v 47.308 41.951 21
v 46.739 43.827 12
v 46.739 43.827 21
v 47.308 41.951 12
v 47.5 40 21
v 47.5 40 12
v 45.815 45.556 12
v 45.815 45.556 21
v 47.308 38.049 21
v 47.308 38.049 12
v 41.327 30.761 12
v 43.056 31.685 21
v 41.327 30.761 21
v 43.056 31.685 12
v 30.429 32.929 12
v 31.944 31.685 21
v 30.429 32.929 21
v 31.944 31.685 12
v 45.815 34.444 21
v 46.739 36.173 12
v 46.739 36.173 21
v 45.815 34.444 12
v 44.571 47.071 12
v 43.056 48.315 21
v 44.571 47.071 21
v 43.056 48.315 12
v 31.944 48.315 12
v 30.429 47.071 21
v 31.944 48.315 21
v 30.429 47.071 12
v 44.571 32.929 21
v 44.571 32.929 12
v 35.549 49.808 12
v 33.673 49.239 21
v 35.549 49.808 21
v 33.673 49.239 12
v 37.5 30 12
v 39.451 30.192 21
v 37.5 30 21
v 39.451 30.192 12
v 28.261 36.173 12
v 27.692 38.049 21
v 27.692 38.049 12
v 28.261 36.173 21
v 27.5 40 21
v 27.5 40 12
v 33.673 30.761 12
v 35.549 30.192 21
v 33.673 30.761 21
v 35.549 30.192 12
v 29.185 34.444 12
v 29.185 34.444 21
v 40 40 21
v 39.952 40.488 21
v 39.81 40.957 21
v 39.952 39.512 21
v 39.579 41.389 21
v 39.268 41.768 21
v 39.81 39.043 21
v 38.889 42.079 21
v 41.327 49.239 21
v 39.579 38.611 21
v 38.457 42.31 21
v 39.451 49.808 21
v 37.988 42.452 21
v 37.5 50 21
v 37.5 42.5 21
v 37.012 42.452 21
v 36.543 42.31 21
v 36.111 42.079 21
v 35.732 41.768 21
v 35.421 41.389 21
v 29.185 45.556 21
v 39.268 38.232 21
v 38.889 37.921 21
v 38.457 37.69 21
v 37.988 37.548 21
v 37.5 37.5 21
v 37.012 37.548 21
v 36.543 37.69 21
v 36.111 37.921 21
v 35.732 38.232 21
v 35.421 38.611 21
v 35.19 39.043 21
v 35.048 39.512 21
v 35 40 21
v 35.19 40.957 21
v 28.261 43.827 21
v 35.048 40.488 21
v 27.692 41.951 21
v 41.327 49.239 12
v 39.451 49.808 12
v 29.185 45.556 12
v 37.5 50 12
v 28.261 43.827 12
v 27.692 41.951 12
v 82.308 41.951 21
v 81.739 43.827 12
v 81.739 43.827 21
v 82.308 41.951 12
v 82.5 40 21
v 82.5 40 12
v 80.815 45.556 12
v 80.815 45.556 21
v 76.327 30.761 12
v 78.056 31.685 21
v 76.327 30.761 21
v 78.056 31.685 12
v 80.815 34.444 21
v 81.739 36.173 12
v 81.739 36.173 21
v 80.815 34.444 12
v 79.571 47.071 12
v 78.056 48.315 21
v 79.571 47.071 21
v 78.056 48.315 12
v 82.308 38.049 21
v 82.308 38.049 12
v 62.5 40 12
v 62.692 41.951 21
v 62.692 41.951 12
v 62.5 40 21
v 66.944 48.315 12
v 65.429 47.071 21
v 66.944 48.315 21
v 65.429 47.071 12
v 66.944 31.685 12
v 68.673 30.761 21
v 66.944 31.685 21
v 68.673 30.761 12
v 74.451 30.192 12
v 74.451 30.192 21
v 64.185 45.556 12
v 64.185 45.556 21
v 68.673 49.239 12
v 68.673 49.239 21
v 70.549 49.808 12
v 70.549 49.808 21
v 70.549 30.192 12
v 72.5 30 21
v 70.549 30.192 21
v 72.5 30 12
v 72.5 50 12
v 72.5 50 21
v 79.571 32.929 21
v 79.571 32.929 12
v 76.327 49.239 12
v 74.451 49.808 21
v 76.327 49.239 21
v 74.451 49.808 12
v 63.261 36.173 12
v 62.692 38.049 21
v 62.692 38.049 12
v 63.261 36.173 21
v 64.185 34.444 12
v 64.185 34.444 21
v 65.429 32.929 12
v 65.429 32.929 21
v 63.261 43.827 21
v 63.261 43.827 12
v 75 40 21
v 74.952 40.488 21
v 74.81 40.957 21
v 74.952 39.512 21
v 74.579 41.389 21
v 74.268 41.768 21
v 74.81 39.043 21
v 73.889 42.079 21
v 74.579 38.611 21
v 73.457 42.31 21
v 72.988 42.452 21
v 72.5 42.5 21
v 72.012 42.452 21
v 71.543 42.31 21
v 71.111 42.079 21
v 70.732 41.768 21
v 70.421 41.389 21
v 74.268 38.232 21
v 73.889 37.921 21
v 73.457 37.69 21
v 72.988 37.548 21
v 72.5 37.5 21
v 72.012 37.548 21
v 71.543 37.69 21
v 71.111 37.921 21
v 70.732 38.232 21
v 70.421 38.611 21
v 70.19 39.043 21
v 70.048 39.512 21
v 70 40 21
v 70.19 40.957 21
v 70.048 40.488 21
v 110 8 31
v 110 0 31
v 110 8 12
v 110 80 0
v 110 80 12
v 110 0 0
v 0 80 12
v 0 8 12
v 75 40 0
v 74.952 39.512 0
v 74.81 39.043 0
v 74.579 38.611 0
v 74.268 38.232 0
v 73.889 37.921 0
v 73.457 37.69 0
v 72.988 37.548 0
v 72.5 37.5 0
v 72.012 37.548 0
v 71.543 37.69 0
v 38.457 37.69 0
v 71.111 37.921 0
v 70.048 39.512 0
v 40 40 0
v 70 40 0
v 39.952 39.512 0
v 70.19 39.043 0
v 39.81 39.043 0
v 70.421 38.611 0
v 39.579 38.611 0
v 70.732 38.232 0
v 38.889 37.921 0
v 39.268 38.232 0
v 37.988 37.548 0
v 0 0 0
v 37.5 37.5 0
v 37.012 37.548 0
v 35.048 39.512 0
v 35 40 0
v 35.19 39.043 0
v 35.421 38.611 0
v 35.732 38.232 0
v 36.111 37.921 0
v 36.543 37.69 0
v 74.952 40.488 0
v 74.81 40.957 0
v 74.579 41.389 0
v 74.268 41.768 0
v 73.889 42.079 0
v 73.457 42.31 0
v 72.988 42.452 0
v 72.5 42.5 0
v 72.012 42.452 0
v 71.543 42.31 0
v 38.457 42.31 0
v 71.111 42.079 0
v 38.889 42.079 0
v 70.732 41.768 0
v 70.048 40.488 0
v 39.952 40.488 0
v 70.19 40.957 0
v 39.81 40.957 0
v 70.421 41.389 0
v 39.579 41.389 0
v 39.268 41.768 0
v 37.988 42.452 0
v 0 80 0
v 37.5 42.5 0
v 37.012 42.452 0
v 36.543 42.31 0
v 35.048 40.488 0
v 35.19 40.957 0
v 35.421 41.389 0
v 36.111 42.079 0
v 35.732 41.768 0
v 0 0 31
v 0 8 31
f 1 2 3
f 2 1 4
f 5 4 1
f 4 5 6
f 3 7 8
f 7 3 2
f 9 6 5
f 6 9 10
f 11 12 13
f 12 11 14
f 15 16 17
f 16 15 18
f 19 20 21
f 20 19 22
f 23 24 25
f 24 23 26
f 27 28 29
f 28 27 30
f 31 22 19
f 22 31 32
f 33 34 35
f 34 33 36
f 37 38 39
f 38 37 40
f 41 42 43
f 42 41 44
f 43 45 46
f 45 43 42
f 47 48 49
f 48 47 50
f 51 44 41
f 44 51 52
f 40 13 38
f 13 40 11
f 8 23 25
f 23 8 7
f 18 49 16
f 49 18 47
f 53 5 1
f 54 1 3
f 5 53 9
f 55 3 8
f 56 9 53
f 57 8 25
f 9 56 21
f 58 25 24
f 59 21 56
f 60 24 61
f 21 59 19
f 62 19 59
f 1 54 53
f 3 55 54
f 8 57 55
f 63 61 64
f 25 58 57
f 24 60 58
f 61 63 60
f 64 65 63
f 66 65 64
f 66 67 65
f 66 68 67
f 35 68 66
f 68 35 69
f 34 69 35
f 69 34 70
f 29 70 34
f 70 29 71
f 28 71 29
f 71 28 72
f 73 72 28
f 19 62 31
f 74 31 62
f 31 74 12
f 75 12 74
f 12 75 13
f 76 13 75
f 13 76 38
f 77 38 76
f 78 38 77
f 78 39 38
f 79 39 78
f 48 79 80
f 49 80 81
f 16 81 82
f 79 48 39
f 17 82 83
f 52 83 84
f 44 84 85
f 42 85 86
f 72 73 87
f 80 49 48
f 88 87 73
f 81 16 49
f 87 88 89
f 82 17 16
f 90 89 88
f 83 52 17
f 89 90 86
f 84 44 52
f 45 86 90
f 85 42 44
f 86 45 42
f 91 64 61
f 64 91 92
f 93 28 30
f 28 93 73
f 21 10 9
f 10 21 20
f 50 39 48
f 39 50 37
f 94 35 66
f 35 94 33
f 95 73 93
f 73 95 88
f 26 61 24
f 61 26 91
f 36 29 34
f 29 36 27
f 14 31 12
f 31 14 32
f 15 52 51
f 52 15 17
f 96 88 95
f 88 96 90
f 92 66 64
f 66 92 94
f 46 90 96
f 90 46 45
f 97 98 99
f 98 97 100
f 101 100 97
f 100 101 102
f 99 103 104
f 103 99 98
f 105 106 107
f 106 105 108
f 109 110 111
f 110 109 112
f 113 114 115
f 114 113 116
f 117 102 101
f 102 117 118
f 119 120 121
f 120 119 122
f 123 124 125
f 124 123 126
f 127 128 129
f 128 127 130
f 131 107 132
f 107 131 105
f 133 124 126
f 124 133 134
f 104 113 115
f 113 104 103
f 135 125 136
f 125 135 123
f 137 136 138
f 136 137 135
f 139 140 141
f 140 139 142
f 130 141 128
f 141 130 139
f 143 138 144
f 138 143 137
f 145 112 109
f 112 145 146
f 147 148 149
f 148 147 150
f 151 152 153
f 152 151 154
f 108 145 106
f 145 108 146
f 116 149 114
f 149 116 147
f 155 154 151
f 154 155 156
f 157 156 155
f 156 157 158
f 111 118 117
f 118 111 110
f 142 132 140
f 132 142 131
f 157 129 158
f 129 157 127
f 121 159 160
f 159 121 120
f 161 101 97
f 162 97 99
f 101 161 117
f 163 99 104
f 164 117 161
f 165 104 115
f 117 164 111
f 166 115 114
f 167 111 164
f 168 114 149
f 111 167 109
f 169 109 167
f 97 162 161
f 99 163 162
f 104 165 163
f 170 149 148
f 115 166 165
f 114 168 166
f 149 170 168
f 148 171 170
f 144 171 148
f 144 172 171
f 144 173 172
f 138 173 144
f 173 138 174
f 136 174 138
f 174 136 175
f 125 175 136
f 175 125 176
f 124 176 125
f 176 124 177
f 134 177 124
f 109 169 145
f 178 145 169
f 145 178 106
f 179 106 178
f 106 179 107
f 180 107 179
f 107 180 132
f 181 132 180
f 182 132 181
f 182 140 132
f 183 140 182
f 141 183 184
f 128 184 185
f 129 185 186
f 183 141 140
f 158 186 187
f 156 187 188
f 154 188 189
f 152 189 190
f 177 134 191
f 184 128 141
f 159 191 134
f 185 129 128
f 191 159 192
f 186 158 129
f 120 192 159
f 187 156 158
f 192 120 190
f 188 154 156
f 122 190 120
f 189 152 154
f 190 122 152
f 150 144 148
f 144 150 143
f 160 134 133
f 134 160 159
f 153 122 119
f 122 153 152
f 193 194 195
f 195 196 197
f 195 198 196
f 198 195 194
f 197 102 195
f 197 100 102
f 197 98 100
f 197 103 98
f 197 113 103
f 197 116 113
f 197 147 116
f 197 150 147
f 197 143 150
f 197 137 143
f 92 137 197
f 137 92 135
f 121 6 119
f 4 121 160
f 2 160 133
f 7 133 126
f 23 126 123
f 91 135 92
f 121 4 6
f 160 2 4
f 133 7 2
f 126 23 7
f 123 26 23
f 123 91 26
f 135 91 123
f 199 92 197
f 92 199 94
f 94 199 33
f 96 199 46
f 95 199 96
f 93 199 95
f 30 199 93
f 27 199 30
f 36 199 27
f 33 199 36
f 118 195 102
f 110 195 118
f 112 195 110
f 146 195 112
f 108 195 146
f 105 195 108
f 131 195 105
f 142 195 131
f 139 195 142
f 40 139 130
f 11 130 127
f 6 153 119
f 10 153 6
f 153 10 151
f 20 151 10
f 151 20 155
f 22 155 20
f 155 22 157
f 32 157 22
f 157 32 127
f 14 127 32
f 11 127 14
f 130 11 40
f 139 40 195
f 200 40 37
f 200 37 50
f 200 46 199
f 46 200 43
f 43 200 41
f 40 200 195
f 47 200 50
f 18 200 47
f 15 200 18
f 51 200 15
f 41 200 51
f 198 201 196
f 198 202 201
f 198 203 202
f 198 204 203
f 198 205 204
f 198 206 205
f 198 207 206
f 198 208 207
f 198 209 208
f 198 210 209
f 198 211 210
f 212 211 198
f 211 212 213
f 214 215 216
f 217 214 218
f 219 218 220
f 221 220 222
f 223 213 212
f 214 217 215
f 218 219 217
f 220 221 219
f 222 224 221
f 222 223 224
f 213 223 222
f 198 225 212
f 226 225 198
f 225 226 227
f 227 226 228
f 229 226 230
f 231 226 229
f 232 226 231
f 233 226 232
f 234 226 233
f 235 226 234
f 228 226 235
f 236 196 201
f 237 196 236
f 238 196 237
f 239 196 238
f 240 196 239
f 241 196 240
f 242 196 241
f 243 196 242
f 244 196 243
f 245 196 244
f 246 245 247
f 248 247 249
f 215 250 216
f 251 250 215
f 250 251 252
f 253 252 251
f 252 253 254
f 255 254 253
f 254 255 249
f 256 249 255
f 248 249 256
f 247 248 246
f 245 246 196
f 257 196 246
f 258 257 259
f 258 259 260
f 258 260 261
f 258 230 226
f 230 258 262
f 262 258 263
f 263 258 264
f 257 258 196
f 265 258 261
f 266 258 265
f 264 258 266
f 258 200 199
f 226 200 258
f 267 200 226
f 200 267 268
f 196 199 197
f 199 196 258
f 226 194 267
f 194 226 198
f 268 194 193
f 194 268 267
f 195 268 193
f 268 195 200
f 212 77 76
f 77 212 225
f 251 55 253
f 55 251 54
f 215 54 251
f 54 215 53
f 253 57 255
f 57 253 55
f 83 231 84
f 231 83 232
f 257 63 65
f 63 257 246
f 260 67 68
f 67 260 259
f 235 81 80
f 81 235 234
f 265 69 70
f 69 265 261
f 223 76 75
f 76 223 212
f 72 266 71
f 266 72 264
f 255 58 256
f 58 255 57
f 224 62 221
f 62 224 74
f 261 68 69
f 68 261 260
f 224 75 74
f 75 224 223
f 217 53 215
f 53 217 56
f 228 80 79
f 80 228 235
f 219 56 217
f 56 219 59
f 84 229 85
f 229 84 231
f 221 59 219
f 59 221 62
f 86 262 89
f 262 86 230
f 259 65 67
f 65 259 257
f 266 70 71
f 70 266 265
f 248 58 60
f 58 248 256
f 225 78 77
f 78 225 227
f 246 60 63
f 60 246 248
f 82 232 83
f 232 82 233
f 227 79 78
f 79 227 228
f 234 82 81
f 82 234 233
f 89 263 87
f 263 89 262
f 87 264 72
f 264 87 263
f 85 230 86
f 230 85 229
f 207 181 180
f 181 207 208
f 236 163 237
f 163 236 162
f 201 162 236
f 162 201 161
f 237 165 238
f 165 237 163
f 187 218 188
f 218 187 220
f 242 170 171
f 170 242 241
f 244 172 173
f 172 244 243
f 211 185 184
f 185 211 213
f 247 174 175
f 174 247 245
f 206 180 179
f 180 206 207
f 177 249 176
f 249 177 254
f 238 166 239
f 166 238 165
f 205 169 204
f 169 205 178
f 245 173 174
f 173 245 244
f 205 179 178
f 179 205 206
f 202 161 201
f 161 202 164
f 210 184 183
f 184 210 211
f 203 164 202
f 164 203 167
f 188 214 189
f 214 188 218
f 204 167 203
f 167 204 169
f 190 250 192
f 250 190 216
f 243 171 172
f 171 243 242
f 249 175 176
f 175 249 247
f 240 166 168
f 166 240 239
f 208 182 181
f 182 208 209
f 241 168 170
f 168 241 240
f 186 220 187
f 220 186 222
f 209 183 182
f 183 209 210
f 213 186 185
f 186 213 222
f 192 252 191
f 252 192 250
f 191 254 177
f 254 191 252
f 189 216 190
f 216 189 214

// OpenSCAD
$fn = 32;

// ----------------------------------------------------------------------
// Drill jig: fence jig
// ----------------------------------------------------------------------

// --- parameters (mm) ---
plate_l = 110;            // plate length, X
plate_w = 80;             // plate width, Y
plate_t = 12;             // plate thickness
boss_d = 20;              // guide boss diameter
boss_h = 10;              // boss height above the plate
guide_d = 5;              // guide hole diameter
boss_pitch = 35;          // boss pitch
fence_h = 20;             // fence height above the plate
fence_t = 8;              // fence thickness

n_boss = 2;  // guide bosses
boss_x0 = (plate_l - (n_boss - 1) * boss_pitch) / 2;  // first boss X
boss_top = plate_t - 1 + boss_h;  // boss crown height
fence_top = plate_t - 1 + fence_h;  // fence crown height
total_h = max([fence_top, boss_top]);  // overall height

difference() {
  union() {
  cube([plate_l, plate_w, plate_t]);
  for (i = [0 : n_boss - 1])
    translate([boss_x0 + i * boss_pitch, plate_w / 2, plate_t - 1])
      cylinder(h = boss_h, d = boss_d);
  translate([0, 0, plate_t - 1]) cube([plate_l, fence_t, fence_h]);
  }
  for (i = [0 : n_boss - 1])
    translate([boss_x0 + i * boss_pitch, plate_w / 2, -1])
      cylinder(h = plate_t + boss_h, d = guide_d);
}
